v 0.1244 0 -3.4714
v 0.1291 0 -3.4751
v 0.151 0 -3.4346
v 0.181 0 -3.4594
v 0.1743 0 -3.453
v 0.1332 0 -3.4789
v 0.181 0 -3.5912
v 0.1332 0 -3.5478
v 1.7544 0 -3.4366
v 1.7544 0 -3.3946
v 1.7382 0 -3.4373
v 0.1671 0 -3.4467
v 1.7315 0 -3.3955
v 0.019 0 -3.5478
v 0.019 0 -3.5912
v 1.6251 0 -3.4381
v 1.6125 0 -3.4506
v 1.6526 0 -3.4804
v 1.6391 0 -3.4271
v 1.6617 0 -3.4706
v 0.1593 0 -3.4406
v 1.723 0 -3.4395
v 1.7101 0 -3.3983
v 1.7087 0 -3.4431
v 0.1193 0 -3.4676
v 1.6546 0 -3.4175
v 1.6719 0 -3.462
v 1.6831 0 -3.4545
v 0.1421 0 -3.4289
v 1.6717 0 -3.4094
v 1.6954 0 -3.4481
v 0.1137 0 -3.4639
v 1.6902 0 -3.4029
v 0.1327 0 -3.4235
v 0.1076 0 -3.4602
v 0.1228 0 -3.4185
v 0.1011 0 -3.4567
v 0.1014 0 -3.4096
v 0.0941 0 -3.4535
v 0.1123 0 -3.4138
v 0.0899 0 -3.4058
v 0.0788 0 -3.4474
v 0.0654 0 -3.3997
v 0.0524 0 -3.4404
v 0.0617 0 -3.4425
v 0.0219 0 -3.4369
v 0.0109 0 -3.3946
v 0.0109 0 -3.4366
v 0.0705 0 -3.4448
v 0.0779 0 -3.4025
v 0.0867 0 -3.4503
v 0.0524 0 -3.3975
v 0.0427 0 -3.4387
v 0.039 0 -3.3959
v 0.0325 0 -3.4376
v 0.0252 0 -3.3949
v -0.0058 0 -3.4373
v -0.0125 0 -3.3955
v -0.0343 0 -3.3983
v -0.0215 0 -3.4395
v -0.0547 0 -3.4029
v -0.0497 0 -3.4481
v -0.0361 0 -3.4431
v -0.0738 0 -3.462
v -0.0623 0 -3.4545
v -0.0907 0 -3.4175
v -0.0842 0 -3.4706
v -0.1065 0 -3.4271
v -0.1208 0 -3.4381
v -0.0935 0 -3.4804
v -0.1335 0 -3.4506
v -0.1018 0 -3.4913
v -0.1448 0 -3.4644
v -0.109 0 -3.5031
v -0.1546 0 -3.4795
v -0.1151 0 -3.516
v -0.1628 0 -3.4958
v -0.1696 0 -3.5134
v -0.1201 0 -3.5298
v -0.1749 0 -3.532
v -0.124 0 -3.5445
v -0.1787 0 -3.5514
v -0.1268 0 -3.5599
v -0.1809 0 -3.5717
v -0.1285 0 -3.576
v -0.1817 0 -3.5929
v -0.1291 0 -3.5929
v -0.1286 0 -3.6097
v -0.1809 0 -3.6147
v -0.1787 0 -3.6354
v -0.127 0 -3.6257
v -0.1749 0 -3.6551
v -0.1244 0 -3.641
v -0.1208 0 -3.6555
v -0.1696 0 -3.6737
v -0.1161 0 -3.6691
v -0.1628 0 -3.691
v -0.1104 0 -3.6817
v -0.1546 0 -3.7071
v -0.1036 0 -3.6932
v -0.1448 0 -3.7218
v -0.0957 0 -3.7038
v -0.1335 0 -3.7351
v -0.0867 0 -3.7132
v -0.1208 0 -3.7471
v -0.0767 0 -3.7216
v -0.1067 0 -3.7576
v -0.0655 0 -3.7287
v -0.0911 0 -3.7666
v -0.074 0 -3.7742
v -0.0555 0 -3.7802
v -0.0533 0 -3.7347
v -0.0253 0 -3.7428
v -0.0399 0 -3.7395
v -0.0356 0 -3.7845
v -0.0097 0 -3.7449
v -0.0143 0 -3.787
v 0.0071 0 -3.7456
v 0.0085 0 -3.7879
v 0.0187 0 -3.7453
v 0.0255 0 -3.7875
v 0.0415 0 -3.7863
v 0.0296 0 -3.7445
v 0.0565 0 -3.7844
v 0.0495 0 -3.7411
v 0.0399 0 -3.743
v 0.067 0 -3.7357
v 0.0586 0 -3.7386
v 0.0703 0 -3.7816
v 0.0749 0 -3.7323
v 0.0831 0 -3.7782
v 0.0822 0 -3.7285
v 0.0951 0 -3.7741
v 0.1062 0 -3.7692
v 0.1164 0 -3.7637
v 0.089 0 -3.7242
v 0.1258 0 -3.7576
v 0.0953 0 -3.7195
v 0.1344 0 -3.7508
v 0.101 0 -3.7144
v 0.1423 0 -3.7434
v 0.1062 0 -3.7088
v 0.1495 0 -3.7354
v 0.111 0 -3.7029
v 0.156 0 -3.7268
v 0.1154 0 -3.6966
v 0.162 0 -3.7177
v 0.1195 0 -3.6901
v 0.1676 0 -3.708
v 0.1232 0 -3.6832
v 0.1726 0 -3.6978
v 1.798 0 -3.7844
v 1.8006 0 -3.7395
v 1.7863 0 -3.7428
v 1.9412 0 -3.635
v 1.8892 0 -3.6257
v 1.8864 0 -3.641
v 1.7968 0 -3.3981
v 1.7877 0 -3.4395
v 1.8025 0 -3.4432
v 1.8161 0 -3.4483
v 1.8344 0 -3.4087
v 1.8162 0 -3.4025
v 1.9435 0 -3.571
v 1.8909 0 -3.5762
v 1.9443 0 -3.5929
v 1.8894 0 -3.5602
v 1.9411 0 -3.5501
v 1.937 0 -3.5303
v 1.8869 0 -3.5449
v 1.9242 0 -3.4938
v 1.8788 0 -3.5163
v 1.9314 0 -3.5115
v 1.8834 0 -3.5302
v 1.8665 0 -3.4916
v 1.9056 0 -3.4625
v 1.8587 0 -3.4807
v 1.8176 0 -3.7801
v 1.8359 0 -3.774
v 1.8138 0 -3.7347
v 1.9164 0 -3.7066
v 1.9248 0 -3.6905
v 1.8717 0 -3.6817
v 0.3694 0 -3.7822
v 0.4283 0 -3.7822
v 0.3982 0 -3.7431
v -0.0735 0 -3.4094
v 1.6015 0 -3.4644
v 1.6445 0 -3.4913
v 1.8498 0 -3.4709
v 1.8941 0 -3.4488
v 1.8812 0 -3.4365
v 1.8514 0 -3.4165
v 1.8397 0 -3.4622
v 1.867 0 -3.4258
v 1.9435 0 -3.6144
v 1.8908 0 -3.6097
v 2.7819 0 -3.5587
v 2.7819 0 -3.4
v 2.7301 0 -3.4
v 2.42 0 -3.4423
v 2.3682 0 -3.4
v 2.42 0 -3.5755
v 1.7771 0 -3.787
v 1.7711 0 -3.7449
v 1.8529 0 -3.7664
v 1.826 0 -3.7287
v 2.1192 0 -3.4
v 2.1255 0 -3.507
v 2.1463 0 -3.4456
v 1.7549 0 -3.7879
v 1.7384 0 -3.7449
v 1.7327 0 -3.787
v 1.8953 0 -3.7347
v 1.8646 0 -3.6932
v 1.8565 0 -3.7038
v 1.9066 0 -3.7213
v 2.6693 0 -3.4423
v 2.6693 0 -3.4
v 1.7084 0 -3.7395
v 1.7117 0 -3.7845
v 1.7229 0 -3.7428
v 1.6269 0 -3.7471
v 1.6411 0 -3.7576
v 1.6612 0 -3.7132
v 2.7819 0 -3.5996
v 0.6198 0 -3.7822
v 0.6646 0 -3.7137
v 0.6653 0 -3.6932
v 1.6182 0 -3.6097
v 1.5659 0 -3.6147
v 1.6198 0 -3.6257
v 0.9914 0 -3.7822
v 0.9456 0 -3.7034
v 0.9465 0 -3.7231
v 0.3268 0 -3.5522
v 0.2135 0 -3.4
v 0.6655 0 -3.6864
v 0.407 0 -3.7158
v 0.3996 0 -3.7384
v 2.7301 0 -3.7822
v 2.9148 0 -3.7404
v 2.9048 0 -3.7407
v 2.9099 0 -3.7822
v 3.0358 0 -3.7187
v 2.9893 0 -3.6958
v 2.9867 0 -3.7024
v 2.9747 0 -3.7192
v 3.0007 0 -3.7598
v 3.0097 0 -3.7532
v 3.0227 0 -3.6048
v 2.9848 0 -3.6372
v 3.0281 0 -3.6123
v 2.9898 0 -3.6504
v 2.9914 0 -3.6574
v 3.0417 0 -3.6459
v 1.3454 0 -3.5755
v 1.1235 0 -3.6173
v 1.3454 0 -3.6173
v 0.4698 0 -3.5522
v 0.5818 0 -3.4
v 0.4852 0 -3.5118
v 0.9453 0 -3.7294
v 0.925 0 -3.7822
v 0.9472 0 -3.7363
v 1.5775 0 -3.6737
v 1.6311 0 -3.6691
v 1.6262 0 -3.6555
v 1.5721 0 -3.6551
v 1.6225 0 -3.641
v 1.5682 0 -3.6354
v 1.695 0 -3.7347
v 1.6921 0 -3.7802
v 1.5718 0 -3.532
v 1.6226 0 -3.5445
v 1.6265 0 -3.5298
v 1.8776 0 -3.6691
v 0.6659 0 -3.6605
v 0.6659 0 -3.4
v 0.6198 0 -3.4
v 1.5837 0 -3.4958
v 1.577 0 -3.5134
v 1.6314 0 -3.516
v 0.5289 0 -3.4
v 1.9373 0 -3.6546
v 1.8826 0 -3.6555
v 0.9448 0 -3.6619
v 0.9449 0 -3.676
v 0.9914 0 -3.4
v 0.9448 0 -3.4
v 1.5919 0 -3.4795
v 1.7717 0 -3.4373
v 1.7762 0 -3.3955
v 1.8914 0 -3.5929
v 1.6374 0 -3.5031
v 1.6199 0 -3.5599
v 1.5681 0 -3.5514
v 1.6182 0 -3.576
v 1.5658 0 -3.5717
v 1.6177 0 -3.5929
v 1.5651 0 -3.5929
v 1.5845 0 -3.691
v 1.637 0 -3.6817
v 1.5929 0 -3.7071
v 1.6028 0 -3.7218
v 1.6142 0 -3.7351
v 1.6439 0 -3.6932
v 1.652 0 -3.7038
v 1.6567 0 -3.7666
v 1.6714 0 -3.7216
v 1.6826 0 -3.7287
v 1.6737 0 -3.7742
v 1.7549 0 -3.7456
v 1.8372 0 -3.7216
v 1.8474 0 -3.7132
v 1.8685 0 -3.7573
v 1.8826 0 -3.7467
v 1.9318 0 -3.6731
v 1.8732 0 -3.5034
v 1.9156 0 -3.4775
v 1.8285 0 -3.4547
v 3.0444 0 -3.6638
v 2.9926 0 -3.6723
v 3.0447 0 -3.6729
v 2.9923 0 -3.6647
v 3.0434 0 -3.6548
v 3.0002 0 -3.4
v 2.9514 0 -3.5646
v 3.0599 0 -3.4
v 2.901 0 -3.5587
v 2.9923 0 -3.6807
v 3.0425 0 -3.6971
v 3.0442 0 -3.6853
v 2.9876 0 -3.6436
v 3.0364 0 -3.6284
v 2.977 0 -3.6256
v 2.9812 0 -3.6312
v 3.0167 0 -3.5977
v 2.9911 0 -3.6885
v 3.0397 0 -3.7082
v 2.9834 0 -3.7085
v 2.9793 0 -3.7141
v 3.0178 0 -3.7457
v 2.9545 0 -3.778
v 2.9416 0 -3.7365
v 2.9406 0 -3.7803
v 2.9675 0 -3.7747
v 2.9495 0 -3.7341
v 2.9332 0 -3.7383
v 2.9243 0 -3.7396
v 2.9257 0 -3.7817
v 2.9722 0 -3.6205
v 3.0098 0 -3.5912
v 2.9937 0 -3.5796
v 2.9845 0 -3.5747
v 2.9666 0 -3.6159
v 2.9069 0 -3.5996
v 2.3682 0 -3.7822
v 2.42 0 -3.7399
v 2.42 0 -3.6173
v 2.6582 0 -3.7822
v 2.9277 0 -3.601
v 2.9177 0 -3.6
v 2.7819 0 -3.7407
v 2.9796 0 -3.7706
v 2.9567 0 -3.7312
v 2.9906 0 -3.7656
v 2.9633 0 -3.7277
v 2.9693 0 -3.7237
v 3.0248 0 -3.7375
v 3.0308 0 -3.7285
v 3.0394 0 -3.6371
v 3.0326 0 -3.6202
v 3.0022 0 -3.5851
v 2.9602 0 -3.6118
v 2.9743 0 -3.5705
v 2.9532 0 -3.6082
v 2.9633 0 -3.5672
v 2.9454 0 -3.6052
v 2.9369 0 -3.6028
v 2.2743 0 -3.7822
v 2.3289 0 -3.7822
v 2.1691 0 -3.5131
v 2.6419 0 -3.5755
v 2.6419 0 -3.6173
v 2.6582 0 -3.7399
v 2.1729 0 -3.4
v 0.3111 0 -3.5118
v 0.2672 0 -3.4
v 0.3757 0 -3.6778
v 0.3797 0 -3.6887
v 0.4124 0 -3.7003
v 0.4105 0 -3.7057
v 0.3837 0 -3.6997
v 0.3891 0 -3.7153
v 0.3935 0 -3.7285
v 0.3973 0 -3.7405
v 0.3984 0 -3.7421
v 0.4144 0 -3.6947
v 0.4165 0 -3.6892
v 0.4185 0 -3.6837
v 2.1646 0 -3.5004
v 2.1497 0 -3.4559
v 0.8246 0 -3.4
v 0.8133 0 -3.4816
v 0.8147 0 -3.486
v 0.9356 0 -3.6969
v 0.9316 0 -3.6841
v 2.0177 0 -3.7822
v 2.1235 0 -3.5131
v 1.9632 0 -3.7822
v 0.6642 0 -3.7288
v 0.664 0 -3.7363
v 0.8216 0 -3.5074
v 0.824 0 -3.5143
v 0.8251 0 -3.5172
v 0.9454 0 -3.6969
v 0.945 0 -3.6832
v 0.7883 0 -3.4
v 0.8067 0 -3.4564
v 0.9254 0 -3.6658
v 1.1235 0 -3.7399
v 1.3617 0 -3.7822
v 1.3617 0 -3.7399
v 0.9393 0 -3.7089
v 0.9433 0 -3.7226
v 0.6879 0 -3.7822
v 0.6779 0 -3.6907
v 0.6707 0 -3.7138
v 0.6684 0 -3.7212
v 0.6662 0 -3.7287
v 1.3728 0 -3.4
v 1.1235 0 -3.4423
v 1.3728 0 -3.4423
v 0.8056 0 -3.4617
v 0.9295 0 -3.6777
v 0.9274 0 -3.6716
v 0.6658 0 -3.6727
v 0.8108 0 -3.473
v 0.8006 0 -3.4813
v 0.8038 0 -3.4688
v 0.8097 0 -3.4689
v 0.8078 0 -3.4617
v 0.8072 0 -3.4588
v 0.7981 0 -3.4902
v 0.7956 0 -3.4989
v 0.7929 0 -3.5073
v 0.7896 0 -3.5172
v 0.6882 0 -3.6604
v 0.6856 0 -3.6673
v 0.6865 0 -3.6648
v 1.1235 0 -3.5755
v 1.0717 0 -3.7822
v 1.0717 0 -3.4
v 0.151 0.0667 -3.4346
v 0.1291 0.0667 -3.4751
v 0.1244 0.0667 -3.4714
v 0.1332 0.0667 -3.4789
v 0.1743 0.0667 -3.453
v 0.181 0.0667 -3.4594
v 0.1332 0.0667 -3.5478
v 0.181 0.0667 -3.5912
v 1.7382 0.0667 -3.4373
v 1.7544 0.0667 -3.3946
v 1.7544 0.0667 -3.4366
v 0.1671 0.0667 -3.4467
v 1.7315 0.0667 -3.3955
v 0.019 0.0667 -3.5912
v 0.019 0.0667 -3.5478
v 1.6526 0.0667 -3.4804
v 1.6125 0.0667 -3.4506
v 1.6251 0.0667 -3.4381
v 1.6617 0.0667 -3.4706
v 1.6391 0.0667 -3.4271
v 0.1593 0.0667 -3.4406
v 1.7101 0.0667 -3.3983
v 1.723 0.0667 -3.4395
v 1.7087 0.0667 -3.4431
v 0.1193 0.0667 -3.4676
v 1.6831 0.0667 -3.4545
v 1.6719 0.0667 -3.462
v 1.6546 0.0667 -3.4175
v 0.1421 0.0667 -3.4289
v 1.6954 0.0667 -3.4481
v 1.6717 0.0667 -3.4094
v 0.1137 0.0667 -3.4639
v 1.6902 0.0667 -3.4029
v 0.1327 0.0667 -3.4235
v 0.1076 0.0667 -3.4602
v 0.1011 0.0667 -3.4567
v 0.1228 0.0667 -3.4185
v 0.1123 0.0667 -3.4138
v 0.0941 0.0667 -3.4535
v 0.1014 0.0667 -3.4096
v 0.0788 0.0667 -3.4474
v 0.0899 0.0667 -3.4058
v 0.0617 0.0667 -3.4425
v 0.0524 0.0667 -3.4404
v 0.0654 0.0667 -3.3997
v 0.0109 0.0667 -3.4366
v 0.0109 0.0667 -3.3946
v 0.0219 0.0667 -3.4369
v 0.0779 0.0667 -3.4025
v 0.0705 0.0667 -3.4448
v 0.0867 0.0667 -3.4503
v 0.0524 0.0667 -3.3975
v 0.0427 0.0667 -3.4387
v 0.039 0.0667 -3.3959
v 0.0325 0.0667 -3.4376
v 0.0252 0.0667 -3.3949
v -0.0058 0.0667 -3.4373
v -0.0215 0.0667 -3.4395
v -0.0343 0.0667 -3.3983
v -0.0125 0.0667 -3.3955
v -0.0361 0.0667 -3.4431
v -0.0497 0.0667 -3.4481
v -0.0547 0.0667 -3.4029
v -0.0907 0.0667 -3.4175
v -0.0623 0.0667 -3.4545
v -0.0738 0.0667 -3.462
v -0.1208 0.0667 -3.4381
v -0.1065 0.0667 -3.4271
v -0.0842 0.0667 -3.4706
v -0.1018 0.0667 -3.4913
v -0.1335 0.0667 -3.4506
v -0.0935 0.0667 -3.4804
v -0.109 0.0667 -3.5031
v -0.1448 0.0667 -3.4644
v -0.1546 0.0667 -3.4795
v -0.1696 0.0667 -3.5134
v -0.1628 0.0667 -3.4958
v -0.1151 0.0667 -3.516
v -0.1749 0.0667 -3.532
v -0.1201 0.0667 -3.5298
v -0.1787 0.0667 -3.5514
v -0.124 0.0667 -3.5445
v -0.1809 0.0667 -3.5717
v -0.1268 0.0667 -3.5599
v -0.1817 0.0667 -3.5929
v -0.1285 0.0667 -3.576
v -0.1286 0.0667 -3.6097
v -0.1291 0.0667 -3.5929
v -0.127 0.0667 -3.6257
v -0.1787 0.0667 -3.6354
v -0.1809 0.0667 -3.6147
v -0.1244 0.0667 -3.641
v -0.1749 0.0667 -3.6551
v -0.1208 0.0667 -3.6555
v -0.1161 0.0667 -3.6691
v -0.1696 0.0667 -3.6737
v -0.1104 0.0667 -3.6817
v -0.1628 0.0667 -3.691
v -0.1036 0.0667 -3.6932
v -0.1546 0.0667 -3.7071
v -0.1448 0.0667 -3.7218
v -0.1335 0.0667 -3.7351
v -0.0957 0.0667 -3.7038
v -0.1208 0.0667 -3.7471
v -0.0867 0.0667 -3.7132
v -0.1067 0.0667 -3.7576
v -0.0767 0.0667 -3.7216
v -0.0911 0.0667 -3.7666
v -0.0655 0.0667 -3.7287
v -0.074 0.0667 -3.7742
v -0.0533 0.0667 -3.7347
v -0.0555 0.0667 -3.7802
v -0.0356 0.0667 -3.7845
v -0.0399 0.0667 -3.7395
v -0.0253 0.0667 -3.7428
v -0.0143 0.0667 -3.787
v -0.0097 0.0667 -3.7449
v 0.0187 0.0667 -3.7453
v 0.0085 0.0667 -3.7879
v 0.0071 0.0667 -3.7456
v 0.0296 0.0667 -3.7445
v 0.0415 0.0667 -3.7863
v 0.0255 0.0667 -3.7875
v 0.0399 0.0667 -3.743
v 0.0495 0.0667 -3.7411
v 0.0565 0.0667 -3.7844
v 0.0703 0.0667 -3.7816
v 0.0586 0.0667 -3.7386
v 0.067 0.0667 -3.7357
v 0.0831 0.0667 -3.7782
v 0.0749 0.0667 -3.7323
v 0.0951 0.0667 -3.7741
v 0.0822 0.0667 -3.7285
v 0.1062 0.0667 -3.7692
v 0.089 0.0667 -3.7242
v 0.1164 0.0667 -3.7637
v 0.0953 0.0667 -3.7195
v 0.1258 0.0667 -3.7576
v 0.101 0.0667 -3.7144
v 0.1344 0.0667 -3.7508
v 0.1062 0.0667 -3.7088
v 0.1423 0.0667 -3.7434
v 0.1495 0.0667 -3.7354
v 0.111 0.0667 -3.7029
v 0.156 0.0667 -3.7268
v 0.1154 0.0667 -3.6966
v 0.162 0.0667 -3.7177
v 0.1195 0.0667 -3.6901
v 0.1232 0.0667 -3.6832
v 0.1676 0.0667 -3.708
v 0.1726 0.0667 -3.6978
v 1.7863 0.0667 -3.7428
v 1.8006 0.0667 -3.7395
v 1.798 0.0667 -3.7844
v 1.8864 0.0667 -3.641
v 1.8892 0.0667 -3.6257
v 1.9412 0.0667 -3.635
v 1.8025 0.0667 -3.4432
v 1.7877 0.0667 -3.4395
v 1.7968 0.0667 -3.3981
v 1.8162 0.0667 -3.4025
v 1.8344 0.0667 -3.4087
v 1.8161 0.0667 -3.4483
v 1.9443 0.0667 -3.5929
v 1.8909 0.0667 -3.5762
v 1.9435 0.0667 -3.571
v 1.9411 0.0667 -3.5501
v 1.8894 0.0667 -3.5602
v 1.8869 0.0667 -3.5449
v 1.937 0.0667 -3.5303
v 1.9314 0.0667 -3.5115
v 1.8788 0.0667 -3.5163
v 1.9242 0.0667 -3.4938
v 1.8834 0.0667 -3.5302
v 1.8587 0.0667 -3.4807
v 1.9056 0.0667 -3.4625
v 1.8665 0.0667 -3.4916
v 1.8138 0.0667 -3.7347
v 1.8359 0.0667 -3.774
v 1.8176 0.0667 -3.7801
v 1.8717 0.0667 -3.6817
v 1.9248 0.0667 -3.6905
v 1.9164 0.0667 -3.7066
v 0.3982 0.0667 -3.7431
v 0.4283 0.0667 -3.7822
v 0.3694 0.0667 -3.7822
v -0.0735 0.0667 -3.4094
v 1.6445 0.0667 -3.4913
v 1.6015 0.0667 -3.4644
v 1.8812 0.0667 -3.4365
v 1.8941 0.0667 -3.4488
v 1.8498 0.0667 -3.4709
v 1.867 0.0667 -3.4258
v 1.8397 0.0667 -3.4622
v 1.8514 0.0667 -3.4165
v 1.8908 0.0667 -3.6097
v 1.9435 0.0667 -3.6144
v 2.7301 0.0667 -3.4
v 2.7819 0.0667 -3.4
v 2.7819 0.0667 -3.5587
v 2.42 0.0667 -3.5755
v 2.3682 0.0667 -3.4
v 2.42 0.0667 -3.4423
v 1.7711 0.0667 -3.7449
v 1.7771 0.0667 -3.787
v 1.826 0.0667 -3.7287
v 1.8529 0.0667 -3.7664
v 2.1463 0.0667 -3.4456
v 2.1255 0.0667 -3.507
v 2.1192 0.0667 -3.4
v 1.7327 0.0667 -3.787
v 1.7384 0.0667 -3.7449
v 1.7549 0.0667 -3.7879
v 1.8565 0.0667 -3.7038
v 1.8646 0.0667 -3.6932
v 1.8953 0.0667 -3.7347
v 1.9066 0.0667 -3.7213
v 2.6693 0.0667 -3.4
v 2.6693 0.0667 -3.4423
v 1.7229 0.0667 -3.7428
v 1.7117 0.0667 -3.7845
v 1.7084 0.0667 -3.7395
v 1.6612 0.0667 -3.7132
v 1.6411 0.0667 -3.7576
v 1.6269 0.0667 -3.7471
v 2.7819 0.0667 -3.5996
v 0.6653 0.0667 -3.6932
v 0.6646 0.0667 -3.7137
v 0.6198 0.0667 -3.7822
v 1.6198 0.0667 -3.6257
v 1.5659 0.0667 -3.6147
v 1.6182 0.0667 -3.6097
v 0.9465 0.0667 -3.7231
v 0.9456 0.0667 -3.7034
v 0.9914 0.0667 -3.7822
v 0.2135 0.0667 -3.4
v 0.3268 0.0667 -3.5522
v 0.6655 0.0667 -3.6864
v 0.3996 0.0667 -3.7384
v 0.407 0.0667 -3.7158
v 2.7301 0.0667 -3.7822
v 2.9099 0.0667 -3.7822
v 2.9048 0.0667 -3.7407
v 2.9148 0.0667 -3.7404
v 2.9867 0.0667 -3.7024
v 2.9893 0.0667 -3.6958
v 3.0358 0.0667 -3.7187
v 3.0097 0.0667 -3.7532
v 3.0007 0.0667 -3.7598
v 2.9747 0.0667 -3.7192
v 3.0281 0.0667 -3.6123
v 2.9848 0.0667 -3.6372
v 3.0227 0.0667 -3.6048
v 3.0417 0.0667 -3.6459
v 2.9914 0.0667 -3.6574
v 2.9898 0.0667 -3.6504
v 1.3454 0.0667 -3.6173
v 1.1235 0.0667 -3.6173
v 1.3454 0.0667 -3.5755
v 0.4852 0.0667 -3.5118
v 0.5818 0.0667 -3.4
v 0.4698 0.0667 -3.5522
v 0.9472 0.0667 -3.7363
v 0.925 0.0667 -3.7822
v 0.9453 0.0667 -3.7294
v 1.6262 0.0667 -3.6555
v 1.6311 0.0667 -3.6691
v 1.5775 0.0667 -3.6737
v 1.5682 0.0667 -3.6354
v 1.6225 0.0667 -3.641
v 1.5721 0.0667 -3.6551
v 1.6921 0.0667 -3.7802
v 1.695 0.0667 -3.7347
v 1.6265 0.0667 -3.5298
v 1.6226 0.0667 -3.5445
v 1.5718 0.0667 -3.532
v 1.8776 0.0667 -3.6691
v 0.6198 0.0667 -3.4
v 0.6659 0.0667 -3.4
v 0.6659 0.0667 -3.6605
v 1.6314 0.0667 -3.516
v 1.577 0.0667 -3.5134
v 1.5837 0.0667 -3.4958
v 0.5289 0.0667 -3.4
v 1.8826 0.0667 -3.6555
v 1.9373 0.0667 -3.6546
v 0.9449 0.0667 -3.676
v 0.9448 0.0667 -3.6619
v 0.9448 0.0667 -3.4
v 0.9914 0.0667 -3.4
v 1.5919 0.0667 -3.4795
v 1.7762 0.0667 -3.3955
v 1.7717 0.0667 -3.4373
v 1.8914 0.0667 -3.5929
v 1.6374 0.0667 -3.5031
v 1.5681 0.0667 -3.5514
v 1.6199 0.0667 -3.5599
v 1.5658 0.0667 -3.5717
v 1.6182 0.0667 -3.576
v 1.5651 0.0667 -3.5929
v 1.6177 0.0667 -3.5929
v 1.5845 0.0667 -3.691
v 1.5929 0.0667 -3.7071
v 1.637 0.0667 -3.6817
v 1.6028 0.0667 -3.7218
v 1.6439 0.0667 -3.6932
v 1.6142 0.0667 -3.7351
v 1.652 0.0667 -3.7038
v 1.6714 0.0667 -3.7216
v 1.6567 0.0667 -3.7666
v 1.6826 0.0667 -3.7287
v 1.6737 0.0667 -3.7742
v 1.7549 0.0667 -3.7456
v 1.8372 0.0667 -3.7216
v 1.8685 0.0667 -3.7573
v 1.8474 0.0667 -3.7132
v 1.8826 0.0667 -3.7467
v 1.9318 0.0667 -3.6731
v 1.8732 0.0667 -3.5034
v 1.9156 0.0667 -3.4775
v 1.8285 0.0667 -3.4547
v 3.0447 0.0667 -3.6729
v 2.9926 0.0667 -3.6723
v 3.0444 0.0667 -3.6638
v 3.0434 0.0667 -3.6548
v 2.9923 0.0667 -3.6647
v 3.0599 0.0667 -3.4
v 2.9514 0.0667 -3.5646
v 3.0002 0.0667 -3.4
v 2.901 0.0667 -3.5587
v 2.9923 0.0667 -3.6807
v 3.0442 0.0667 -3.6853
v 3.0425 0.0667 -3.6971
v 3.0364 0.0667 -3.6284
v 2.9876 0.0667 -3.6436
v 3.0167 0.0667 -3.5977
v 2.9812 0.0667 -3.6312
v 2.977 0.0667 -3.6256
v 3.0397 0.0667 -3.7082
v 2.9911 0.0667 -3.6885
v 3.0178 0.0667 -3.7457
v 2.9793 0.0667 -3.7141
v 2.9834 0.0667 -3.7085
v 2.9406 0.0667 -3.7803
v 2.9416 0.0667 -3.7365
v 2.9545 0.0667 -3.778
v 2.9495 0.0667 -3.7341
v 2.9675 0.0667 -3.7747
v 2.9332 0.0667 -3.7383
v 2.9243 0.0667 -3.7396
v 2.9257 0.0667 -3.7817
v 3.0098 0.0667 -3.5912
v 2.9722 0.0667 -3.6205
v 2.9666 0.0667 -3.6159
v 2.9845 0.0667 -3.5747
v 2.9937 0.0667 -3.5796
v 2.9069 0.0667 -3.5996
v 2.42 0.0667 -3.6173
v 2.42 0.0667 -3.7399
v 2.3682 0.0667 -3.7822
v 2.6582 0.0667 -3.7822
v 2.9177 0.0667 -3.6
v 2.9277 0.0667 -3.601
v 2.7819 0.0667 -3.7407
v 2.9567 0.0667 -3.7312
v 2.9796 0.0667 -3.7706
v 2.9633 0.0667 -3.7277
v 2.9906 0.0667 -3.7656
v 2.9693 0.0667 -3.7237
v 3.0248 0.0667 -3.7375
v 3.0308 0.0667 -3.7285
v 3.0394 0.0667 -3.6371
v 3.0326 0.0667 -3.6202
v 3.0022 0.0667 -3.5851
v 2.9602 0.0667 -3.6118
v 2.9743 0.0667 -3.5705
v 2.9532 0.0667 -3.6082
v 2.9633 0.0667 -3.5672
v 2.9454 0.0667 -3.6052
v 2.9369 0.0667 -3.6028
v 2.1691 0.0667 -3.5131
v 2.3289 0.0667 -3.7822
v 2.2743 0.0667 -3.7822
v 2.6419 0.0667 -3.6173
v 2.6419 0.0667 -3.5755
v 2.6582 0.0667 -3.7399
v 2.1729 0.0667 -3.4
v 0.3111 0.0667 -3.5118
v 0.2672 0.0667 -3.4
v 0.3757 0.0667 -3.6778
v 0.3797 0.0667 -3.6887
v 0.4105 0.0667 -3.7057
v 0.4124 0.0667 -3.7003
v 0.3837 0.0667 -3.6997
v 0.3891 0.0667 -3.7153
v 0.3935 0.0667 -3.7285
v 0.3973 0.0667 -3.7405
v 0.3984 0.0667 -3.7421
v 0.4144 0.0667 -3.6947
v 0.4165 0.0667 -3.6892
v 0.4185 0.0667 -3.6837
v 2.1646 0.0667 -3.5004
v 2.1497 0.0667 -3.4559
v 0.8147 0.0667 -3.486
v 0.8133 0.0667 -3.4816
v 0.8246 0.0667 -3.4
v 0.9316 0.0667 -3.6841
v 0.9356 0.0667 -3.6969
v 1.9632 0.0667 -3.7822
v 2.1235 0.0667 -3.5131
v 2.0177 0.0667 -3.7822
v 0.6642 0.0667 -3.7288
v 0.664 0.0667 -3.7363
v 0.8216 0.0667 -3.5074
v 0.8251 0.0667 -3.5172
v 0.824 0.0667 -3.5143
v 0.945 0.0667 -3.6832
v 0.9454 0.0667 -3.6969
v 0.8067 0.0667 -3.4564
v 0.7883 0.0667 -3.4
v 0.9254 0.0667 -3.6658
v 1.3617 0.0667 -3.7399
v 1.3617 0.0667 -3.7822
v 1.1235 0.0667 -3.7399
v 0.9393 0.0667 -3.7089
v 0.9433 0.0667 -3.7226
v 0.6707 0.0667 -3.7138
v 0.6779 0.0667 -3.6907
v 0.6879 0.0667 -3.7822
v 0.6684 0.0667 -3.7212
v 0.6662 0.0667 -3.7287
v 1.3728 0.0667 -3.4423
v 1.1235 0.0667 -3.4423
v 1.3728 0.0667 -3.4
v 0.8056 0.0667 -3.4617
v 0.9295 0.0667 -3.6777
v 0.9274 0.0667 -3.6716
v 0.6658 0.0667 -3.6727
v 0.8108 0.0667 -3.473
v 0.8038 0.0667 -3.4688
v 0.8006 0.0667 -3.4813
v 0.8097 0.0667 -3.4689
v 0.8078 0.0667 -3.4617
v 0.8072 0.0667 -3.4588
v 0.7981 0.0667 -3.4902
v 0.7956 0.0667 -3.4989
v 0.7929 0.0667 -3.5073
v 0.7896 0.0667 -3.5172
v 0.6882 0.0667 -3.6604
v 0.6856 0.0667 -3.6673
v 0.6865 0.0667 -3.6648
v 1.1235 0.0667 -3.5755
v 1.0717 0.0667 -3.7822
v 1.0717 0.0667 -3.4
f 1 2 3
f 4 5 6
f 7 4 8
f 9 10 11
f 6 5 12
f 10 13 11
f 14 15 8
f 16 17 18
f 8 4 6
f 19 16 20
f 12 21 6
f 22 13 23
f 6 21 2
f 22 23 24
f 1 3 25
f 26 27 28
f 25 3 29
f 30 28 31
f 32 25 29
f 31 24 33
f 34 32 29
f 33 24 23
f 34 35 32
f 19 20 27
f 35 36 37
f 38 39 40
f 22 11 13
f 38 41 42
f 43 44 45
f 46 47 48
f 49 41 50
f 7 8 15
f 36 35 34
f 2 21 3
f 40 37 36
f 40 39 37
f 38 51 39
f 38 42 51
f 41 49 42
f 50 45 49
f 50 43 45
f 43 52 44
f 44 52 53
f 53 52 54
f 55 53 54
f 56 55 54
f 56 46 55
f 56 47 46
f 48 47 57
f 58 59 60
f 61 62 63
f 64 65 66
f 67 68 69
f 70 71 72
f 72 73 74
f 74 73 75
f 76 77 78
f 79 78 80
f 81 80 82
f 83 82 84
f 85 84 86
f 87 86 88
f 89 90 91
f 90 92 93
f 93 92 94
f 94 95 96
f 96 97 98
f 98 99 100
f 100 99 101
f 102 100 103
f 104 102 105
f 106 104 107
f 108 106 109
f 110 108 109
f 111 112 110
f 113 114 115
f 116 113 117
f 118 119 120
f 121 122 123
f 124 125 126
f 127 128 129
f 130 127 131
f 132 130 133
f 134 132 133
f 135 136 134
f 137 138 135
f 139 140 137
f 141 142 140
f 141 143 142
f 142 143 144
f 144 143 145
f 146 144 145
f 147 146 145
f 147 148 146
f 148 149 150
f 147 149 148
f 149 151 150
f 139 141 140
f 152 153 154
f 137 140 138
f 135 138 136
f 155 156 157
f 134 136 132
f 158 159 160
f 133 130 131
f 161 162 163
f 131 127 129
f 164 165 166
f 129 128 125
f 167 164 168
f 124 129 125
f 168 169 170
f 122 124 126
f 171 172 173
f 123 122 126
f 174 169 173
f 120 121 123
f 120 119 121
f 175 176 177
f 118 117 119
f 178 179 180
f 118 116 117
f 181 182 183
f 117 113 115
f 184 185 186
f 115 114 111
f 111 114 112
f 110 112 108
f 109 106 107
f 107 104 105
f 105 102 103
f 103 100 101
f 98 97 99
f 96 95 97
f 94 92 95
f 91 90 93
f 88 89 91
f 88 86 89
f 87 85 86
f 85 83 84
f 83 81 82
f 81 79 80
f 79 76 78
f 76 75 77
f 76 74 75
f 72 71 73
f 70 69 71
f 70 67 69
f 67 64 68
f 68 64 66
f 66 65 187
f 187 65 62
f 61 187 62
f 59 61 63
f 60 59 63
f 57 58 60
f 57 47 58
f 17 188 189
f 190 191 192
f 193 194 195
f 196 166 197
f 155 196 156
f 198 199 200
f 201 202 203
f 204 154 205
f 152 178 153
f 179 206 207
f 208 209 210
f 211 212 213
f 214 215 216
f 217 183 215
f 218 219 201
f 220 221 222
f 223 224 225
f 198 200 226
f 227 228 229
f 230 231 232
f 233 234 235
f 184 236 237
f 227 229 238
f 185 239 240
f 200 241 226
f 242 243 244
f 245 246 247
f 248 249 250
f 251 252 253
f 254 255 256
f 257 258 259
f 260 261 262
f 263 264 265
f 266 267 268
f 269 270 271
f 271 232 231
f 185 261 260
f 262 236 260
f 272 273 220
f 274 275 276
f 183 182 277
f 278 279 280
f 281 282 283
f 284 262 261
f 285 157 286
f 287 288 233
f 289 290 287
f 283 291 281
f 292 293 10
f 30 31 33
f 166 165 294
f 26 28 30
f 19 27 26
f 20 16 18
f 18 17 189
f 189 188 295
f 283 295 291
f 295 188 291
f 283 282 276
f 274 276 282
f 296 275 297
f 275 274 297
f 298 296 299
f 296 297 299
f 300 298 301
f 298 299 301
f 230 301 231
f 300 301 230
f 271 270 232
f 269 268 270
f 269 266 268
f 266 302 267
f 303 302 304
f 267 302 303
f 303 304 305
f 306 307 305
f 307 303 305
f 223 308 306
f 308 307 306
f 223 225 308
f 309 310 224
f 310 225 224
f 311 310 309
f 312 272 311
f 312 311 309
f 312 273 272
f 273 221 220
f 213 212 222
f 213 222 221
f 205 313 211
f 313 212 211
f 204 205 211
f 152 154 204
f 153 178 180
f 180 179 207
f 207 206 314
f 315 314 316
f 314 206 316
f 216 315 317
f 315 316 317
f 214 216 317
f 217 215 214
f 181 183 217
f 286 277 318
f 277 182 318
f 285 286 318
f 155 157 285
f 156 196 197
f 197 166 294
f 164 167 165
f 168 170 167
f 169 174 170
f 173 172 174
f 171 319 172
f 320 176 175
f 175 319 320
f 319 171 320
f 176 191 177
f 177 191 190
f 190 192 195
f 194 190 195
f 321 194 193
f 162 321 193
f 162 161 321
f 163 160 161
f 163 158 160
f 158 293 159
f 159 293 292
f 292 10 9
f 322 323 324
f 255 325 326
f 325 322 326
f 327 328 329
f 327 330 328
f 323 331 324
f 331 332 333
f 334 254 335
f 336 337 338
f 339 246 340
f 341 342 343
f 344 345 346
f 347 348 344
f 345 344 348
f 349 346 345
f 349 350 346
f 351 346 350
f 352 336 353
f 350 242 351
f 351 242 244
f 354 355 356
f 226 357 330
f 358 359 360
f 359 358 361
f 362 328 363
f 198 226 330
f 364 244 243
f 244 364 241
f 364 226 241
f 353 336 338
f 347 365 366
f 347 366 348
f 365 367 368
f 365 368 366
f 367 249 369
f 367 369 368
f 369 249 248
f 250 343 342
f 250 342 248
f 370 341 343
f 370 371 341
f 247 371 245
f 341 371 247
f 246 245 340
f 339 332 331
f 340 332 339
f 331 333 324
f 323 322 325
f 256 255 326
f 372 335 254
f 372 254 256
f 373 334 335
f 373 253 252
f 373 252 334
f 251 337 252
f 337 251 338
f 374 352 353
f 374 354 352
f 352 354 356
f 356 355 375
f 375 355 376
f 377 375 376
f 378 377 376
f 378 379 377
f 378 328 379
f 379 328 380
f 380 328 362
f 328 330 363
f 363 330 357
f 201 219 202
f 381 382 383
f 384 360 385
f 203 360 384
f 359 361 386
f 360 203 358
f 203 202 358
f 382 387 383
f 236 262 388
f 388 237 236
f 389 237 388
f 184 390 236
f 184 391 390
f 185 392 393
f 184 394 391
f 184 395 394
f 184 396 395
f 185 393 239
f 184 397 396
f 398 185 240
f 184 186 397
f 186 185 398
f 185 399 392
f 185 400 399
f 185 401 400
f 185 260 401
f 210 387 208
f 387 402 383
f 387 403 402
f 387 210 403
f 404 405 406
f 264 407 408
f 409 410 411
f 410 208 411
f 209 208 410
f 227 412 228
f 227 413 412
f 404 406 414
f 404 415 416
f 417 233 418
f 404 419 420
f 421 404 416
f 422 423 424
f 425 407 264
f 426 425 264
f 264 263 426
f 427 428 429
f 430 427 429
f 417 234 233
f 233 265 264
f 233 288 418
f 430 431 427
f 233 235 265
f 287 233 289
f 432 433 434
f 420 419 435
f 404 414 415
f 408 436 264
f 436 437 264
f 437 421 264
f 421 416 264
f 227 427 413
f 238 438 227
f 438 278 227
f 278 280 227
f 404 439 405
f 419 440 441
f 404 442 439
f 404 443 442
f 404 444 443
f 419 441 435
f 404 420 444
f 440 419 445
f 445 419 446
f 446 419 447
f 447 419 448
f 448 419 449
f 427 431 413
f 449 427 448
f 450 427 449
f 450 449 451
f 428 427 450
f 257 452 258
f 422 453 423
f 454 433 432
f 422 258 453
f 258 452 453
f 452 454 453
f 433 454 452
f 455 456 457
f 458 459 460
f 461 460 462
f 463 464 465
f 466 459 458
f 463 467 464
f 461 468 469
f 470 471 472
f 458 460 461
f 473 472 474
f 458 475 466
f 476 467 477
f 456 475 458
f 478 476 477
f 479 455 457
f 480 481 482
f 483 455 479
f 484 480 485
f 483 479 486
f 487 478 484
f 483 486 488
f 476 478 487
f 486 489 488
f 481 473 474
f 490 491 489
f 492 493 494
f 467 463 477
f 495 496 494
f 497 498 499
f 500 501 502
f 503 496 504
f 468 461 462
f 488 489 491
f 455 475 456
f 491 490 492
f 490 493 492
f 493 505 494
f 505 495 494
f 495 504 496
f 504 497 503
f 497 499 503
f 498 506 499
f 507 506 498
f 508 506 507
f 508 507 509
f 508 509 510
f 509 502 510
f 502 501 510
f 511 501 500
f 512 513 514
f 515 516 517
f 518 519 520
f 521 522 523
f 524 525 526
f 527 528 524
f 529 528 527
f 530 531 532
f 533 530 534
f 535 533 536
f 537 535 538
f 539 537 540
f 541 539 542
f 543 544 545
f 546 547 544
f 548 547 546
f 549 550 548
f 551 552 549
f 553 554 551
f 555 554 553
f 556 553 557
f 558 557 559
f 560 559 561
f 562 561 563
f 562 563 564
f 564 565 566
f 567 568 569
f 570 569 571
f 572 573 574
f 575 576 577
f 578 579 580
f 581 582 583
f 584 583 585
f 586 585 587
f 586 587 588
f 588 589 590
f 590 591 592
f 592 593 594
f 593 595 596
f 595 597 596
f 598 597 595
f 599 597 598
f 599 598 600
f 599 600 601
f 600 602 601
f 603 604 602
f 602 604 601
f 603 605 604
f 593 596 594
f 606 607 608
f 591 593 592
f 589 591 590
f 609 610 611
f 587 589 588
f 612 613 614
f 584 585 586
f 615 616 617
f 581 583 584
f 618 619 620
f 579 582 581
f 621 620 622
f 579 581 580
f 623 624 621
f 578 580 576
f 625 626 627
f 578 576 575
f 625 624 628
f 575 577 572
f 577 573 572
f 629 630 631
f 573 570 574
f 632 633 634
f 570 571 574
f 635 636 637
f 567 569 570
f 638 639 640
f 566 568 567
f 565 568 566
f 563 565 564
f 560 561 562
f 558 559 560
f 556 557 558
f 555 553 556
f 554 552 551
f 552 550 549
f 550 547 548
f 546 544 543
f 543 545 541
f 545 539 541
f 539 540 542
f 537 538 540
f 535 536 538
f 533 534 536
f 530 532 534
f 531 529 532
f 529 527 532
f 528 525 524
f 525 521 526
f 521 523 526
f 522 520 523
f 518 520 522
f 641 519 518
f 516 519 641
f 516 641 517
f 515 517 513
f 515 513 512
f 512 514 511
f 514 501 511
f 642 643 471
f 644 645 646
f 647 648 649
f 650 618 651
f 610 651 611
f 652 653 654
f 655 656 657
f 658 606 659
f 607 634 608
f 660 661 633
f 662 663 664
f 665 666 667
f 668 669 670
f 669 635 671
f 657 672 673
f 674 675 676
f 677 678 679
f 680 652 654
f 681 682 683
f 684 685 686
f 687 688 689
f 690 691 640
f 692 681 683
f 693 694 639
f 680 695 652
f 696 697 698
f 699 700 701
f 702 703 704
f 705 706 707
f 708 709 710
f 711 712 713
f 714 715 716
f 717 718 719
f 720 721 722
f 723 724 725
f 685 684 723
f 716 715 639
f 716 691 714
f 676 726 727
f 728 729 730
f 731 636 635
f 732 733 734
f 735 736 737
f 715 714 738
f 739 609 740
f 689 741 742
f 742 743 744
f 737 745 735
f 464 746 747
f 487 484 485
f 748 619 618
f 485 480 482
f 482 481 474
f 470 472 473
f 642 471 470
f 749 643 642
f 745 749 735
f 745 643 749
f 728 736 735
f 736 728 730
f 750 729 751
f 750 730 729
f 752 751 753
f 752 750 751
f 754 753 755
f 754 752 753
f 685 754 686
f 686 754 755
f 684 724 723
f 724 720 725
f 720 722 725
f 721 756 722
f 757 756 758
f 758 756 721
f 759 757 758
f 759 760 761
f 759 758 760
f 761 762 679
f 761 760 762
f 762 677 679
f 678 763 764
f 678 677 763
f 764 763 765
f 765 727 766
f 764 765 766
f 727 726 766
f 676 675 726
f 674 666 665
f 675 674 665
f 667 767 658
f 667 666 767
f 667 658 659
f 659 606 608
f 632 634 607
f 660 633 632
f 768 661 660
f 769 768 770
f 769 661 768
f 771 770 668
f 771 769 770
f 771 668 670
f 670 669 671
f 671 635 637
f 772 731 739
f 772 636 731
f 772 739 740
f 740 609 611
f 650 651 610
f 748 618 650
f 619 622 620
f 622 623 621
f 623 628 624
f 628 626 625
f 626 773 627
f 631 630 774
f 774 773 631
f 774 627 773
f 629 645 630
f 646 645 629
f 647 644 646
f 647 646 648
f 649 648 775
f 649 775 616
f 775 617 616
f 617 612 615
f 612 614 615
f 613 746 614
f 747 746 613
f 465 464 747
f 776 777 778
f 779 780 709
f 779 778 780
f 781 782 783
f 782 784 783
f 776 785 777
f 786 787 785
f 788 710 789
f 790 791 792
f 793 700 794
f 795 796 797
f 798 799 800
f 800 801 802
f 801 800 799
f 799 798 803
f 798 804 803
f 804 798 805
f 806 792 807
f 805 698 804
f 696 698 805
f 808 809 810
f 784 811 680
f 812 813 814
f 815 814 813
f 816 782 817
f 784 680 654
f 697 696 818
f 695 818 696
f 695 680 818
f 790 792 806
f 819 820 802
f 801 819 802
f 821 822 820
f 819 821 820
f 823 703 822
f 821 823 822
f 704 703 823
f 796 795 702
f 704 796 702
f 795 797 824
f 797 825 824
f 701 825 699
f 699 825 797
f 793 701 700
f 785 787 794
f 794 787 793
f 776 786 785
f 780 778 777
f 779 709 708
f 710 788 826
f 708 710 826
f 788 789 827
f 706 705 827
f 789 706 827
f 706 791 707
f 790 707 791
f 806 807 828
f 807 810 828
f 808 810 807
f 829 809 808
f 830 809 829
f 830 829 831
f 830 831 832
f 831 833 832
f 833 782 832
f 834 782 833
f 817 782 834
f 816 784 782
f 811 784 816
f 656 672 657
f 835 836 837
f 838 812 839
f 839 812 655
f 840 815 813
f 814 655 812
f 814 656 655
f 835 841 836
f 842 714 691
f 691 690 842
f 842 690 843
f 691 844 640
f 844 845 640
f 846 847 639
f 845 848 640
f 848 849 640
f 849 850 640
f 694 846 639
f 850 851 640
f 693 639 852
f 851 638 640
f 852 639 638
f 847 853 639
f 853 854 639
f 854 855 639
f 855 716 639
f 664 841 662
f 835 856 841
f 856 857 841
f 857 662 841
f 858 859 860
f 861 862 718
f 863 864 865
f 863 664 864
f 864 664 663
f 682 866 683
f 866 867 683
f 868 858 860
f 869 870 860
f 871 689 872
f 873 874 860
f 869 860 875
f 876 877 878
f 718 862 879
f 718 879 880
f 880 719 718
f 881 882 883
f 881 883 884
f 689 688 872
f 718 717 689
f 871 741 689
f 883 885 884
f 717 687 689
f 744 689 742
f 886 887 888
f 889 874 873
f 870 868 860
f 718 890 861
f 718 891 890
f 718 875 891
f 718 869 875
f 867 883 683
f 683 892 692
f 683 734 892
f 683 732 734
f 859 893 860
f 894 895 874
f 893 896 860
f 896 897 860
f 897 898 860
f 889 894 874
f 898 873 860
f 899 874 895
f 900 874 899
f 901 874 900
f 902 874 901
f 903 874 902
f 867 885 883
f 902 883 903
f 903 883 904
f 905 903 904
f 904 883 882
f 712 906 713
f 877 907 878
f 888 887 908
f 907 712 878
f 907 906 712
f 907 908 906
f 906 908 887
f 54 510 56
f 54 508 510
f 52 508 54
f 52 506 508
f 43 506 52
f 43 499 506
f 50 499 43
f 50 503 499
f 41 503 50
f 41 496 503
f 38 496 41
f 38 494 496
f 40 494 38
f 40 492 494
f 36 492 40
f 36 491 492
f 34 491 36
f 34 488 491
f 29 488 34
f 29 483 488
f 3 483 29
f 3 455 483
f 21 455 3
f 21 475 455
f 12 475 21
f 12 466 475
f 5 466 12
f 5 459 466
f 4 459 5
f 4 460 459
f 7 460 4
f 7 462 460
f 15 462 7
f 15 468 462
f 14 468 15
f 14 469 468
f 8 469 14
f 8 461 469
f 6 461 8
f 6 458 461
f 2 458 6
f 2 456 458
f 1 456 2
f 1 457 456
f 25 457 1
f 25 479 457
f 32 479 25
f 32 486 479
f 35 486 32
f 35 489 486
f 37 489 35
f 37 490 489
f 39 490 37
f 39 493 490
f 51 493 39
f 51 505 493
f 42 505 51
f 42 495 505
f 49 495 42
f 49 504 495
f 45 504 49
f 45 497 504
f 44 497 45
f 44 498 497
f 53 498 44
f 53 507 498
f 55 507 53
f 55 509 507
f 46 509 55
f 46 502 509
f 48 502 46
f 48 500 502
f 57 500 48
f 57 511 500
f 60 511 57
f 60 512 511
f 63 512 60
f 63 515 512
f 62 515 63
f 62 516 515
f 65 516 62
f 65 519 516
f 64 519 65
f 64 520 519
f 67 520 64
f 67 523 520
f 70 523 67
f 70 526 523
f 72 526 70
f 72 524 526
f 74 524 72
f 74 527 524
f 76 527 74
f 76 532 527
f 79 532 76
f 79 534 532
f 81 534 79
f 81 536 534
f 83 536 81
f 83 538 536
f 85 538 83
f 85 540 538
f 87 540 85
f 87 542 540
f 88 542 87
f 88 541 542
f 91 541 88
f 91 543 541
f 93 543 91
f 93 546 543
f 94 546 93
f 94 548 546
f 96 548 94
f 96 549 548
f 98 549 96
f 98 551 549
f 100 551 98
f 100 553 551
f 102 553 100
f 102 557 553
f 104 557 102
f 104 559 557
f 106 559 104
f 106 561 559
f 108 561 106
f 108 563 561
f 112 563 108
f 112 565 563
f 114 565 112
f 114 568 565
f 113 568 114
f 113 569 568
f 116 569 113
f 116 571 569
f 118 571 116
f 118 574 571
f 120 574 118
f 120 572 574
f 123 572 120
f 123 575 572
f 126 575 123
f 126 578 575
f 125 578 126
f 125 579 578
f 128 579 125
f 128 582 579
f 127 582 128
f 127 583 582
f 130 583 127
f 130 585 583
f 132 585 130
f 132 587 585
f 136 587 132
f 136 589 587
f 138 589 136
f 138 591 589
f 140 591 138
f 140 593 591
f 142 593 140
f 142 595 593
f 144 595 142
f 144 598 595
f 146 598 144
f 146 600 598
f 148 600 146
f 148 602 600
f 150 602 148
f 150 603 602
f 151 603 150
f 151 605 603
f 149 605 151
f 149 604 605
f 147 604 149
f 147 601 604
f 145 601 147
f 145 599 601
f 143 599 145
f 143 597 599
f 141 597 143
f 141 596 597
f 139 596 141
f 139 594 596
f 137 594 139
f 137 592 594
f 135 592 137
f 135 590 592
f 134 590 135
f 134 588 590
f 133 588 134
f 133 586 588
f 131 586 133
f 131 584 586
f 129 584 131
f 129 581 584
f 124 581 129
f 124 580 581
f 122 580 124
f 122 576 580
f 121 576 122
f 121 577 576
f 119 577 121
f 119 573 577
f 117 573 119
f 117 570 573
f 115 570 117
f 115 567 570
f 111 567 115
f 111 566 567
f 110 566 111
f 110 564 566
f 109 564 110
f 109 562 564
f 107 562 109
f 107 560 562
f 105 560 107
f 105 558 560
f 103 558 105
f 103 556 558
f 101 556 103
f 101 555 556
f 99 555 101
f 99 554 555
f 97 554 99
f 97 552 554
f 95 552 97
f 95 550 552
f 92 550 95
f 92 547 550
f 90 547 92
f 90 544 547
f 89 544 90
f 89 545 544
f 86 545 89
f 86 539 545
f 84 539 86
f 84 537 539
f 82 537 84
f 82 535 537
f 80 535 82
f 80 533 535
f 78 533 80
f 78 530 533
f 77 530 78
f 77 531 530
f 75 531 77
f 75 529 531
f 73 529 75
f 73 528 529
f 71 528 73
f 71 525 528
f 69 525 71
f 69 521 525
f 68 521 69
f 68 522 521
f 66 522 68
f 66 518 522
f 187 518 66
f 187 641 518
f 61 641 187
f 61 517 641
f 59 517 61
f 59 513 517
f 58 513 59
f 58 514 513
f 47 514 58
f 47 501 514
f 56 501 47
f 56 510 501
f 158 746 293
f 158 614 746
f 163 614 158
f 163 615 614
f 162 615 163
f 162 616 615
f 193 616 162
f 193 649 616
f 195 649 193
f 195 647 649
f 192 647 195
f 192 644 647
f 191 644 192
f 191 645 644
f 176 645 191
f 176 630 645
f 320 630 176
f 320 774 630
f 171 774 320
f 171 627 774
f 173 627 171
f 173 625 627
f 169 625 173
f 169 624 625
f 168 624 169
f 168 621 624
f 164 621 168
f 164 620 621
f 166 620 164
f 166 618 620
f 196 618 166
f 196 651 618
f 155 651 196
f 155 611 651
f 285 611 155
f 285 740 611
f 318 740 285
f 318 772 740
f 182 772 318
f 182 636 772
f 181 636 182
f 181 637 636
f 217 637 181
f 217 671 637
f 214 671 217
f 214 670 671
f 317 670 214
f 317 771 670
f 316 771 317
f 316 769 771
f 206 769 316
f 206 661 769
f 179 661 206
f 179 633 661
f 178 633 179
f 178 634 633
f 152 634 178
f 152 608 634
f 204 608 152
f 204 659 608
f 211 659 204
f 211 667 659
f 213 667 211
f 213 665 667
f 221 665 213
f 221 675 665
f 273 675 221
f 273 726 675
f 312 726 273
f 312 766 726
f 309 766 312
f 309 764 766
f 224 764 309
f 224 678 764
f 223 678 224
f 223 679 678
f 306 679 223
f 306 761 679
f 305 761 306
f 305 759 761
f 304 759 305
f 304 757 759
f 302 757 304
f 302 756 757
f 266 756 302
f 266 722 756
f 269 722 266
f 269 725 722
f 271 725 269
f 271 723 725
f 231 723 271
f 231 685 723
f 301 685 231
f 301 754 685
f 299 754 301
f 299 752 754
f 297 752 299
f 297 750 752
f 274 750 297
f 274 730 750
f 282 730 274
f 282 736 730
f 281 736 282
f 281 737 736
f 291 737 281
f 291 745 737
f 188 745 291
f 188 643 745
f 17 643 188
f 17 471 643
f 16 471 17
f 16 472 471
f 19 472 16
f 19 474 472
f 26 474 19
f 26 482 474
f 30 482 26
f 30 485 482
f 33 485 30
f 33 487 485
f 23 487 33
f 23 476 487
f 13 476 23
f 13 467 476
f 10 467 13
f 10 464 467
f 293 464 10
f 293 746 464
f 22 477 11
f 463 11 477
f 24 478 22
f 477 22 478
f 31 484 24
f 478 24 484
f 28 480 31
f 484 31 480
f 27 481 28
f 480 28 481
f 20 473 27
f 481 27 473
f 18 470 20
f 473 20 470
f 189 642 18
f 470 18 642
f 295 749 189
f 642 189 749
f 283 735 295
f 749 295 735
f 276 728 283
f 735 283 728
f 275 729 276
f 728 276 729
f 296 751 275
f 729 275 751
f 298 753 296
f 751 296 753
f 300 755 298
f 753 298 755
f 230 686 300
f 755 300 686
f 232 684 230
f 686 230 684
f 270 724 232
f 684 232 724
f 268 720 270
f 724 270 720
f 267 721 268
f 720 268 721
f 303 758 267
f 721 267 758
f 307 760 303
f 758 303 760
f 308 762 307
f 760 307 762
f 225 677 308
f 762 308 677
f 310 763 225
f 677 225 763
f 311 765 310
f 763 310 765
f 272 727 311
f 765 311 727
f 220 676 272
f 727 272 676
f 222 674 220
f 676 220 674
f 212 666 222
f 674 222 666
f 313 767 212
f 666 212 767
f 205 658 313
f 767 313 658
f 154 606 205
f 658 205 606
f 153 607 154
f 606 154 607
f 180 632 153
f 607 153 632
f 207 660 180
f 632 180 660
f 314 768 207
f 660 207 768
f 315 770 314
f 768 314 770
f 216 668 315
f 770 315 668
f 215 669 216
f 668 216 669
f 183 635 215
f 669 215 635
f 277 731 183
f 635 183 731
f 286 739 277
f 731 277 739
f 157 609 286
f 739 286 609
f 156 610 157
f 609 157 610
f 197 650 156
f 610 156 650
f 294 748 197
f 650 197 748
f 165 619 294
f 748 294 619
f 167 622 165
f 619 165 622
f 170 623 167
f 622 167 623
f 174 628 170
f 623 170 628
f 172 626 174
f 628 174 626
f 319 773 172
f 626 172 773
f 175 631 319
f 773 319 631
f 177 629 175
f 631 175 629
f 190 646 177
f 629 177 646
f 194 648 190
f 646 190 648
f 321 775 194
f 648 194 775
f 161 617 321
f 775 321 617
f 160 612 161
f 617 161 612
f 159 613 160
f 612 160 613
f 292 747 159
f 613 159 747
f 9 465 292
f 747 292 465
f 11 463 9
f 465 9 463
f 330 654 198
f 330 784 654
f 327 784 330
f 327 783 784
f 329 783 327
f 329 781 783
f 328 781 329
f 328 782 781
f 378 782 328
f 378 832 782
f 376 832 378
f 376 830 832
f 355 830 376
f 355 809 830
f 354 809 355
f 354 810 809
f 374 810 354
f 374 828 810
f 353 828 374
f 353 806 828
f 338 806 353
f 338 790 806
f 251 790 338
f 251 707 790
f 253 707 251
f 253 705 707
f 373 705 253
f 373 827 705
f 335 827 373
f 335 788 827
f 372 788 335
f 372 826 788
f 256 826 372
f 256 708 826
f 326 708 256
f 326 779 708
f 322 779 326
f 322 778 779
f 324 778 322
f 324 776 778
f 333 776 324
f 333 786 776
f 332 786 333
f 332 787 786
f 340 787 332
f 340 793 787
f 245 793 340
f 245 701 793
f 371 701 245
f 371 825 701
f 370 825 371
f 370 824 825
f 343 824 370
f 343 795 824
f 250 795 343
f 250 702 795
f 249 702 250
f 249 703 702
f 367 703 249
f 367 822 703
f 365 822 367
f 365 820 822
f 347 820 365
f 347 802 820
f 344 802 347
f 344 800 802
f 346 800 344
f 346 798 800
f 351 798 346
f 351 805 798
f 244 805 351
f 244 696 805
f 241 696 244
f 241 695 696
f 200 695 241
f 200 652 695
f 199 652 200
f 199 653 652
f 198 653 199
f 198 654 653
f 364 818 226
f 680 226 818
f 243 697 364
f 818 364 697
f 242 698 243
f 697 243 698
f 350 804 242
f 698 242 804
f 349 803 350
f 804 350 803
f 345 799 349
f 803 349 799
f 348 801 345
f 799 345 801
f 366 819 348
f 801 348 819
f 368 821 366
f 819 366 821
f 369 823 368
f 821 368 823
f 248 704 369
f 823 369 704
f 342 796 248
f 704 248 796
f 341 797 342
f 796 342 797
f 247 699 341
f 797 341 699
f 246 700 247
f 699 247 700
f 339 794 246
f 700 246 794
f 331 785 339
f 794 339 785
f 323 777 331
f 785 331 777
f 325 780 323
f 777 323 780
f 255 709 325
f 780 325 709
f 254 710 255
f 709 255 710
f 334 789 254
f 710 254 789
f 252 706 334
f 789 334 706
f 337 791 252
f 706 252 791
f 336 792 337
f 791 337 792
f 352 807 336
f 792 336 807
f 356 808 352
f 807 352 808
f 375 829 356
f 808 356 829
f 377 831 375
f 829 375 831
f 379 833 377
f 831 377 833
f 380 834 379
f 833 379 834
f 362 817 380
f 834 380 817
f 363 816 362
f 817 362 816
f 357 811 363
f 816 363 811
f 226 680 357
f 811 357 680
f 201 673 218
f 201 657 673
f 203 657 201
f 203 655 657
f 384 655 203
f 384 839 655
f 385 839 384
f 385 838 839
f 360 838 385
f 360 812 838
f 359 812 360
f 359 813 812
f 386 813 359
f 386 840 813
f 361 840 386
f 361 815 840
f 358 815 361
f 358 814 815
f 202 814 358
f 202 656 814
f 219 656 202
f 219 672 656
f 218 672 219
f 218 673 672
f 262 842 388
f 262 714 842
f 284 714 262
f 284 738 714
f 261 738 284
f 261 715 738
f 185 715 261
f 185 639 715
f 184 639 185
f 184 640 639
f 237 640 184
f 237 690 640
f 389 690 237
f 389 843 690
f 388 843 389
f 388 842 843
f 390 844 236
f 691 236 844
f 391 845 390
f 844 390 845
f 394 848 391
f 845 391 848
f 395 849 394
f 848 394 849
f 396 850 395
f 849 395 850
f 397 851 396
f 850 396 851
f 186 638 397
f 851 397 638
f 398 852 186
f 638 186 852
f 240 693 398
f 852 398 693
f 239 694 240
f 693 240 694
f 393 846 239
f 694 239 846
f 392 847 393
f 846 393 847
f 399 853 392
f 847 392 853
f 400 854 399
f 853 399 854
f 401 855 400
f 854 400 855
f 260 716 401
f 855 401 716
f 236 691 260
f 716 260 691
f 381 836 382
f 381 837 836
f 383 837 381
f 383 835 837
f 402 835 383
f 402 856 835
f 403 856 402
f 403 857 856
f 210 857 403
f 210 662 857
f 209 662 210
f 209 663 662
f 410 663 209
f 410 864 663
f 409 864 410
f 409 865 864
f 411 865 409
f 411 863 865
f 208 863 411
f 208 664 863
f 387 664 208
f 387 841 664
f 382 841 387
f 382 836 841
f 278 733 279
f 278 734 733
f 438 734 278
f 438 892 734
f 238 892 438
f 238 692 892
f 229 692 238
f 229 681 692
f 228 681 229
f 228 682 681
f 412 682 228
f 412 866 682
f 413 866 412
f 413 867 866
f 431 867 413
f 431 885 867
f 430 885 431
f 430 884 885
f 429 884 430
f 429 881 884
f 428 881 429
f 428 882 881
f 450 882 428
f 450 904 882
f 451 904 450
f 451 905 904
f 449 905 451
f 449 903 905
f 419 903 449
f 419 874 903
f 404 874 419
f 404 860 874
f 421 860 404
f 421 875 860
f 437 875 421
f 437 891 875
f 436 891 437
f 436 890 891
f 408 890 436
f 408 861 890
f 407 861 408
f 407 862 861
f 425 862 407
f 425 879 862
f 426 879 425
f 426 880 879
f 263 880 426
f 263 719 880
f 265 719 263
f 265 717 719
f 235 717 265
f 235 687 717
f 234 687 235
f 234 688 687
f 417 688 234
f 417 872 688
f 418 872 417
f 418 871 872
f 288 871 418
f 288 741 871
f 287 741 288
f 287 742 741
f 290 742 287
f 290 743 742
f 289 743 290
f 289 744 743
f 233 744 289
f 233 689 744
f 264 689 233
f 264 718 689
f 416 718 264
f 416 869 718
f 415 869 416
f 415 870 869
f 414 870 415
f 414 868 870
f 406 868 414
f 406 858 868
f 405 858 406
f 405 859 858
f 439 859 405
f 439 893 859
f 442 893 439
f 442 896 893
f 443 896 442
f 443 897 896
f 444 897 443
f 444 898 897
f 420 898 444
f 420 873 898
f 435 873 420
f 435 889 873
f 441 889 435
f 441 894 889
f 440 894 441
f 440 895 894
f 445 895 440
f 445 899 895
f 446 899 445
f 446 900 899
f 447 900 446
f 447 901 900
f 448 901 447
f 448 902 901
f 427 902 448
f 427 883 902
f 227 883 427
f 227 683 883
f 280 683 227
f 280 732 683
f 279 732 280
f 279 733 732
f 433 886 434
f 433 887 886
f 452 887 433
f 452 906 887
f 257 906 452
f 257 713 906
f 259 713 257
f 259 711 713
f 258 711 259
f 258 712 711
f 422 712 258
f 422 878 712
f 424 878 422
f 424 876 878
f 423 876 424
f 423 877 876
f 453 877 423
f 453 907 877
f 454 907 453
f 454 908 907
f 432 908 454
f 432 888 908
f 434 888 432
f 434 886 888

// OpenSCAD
$fa = 1;
$fs = 0.1;
mag = 1 / 15;
thickness = mag * 1;
height = mag * 15;
width = mag * 10;
border = mag * 1;
translate([2.1 - width, 0.0, -3.4])
rotate([-90,0,0])
  linear_extrude(height = thickness)
  text("GAME OVER", size = 0.4, halign = "center");
